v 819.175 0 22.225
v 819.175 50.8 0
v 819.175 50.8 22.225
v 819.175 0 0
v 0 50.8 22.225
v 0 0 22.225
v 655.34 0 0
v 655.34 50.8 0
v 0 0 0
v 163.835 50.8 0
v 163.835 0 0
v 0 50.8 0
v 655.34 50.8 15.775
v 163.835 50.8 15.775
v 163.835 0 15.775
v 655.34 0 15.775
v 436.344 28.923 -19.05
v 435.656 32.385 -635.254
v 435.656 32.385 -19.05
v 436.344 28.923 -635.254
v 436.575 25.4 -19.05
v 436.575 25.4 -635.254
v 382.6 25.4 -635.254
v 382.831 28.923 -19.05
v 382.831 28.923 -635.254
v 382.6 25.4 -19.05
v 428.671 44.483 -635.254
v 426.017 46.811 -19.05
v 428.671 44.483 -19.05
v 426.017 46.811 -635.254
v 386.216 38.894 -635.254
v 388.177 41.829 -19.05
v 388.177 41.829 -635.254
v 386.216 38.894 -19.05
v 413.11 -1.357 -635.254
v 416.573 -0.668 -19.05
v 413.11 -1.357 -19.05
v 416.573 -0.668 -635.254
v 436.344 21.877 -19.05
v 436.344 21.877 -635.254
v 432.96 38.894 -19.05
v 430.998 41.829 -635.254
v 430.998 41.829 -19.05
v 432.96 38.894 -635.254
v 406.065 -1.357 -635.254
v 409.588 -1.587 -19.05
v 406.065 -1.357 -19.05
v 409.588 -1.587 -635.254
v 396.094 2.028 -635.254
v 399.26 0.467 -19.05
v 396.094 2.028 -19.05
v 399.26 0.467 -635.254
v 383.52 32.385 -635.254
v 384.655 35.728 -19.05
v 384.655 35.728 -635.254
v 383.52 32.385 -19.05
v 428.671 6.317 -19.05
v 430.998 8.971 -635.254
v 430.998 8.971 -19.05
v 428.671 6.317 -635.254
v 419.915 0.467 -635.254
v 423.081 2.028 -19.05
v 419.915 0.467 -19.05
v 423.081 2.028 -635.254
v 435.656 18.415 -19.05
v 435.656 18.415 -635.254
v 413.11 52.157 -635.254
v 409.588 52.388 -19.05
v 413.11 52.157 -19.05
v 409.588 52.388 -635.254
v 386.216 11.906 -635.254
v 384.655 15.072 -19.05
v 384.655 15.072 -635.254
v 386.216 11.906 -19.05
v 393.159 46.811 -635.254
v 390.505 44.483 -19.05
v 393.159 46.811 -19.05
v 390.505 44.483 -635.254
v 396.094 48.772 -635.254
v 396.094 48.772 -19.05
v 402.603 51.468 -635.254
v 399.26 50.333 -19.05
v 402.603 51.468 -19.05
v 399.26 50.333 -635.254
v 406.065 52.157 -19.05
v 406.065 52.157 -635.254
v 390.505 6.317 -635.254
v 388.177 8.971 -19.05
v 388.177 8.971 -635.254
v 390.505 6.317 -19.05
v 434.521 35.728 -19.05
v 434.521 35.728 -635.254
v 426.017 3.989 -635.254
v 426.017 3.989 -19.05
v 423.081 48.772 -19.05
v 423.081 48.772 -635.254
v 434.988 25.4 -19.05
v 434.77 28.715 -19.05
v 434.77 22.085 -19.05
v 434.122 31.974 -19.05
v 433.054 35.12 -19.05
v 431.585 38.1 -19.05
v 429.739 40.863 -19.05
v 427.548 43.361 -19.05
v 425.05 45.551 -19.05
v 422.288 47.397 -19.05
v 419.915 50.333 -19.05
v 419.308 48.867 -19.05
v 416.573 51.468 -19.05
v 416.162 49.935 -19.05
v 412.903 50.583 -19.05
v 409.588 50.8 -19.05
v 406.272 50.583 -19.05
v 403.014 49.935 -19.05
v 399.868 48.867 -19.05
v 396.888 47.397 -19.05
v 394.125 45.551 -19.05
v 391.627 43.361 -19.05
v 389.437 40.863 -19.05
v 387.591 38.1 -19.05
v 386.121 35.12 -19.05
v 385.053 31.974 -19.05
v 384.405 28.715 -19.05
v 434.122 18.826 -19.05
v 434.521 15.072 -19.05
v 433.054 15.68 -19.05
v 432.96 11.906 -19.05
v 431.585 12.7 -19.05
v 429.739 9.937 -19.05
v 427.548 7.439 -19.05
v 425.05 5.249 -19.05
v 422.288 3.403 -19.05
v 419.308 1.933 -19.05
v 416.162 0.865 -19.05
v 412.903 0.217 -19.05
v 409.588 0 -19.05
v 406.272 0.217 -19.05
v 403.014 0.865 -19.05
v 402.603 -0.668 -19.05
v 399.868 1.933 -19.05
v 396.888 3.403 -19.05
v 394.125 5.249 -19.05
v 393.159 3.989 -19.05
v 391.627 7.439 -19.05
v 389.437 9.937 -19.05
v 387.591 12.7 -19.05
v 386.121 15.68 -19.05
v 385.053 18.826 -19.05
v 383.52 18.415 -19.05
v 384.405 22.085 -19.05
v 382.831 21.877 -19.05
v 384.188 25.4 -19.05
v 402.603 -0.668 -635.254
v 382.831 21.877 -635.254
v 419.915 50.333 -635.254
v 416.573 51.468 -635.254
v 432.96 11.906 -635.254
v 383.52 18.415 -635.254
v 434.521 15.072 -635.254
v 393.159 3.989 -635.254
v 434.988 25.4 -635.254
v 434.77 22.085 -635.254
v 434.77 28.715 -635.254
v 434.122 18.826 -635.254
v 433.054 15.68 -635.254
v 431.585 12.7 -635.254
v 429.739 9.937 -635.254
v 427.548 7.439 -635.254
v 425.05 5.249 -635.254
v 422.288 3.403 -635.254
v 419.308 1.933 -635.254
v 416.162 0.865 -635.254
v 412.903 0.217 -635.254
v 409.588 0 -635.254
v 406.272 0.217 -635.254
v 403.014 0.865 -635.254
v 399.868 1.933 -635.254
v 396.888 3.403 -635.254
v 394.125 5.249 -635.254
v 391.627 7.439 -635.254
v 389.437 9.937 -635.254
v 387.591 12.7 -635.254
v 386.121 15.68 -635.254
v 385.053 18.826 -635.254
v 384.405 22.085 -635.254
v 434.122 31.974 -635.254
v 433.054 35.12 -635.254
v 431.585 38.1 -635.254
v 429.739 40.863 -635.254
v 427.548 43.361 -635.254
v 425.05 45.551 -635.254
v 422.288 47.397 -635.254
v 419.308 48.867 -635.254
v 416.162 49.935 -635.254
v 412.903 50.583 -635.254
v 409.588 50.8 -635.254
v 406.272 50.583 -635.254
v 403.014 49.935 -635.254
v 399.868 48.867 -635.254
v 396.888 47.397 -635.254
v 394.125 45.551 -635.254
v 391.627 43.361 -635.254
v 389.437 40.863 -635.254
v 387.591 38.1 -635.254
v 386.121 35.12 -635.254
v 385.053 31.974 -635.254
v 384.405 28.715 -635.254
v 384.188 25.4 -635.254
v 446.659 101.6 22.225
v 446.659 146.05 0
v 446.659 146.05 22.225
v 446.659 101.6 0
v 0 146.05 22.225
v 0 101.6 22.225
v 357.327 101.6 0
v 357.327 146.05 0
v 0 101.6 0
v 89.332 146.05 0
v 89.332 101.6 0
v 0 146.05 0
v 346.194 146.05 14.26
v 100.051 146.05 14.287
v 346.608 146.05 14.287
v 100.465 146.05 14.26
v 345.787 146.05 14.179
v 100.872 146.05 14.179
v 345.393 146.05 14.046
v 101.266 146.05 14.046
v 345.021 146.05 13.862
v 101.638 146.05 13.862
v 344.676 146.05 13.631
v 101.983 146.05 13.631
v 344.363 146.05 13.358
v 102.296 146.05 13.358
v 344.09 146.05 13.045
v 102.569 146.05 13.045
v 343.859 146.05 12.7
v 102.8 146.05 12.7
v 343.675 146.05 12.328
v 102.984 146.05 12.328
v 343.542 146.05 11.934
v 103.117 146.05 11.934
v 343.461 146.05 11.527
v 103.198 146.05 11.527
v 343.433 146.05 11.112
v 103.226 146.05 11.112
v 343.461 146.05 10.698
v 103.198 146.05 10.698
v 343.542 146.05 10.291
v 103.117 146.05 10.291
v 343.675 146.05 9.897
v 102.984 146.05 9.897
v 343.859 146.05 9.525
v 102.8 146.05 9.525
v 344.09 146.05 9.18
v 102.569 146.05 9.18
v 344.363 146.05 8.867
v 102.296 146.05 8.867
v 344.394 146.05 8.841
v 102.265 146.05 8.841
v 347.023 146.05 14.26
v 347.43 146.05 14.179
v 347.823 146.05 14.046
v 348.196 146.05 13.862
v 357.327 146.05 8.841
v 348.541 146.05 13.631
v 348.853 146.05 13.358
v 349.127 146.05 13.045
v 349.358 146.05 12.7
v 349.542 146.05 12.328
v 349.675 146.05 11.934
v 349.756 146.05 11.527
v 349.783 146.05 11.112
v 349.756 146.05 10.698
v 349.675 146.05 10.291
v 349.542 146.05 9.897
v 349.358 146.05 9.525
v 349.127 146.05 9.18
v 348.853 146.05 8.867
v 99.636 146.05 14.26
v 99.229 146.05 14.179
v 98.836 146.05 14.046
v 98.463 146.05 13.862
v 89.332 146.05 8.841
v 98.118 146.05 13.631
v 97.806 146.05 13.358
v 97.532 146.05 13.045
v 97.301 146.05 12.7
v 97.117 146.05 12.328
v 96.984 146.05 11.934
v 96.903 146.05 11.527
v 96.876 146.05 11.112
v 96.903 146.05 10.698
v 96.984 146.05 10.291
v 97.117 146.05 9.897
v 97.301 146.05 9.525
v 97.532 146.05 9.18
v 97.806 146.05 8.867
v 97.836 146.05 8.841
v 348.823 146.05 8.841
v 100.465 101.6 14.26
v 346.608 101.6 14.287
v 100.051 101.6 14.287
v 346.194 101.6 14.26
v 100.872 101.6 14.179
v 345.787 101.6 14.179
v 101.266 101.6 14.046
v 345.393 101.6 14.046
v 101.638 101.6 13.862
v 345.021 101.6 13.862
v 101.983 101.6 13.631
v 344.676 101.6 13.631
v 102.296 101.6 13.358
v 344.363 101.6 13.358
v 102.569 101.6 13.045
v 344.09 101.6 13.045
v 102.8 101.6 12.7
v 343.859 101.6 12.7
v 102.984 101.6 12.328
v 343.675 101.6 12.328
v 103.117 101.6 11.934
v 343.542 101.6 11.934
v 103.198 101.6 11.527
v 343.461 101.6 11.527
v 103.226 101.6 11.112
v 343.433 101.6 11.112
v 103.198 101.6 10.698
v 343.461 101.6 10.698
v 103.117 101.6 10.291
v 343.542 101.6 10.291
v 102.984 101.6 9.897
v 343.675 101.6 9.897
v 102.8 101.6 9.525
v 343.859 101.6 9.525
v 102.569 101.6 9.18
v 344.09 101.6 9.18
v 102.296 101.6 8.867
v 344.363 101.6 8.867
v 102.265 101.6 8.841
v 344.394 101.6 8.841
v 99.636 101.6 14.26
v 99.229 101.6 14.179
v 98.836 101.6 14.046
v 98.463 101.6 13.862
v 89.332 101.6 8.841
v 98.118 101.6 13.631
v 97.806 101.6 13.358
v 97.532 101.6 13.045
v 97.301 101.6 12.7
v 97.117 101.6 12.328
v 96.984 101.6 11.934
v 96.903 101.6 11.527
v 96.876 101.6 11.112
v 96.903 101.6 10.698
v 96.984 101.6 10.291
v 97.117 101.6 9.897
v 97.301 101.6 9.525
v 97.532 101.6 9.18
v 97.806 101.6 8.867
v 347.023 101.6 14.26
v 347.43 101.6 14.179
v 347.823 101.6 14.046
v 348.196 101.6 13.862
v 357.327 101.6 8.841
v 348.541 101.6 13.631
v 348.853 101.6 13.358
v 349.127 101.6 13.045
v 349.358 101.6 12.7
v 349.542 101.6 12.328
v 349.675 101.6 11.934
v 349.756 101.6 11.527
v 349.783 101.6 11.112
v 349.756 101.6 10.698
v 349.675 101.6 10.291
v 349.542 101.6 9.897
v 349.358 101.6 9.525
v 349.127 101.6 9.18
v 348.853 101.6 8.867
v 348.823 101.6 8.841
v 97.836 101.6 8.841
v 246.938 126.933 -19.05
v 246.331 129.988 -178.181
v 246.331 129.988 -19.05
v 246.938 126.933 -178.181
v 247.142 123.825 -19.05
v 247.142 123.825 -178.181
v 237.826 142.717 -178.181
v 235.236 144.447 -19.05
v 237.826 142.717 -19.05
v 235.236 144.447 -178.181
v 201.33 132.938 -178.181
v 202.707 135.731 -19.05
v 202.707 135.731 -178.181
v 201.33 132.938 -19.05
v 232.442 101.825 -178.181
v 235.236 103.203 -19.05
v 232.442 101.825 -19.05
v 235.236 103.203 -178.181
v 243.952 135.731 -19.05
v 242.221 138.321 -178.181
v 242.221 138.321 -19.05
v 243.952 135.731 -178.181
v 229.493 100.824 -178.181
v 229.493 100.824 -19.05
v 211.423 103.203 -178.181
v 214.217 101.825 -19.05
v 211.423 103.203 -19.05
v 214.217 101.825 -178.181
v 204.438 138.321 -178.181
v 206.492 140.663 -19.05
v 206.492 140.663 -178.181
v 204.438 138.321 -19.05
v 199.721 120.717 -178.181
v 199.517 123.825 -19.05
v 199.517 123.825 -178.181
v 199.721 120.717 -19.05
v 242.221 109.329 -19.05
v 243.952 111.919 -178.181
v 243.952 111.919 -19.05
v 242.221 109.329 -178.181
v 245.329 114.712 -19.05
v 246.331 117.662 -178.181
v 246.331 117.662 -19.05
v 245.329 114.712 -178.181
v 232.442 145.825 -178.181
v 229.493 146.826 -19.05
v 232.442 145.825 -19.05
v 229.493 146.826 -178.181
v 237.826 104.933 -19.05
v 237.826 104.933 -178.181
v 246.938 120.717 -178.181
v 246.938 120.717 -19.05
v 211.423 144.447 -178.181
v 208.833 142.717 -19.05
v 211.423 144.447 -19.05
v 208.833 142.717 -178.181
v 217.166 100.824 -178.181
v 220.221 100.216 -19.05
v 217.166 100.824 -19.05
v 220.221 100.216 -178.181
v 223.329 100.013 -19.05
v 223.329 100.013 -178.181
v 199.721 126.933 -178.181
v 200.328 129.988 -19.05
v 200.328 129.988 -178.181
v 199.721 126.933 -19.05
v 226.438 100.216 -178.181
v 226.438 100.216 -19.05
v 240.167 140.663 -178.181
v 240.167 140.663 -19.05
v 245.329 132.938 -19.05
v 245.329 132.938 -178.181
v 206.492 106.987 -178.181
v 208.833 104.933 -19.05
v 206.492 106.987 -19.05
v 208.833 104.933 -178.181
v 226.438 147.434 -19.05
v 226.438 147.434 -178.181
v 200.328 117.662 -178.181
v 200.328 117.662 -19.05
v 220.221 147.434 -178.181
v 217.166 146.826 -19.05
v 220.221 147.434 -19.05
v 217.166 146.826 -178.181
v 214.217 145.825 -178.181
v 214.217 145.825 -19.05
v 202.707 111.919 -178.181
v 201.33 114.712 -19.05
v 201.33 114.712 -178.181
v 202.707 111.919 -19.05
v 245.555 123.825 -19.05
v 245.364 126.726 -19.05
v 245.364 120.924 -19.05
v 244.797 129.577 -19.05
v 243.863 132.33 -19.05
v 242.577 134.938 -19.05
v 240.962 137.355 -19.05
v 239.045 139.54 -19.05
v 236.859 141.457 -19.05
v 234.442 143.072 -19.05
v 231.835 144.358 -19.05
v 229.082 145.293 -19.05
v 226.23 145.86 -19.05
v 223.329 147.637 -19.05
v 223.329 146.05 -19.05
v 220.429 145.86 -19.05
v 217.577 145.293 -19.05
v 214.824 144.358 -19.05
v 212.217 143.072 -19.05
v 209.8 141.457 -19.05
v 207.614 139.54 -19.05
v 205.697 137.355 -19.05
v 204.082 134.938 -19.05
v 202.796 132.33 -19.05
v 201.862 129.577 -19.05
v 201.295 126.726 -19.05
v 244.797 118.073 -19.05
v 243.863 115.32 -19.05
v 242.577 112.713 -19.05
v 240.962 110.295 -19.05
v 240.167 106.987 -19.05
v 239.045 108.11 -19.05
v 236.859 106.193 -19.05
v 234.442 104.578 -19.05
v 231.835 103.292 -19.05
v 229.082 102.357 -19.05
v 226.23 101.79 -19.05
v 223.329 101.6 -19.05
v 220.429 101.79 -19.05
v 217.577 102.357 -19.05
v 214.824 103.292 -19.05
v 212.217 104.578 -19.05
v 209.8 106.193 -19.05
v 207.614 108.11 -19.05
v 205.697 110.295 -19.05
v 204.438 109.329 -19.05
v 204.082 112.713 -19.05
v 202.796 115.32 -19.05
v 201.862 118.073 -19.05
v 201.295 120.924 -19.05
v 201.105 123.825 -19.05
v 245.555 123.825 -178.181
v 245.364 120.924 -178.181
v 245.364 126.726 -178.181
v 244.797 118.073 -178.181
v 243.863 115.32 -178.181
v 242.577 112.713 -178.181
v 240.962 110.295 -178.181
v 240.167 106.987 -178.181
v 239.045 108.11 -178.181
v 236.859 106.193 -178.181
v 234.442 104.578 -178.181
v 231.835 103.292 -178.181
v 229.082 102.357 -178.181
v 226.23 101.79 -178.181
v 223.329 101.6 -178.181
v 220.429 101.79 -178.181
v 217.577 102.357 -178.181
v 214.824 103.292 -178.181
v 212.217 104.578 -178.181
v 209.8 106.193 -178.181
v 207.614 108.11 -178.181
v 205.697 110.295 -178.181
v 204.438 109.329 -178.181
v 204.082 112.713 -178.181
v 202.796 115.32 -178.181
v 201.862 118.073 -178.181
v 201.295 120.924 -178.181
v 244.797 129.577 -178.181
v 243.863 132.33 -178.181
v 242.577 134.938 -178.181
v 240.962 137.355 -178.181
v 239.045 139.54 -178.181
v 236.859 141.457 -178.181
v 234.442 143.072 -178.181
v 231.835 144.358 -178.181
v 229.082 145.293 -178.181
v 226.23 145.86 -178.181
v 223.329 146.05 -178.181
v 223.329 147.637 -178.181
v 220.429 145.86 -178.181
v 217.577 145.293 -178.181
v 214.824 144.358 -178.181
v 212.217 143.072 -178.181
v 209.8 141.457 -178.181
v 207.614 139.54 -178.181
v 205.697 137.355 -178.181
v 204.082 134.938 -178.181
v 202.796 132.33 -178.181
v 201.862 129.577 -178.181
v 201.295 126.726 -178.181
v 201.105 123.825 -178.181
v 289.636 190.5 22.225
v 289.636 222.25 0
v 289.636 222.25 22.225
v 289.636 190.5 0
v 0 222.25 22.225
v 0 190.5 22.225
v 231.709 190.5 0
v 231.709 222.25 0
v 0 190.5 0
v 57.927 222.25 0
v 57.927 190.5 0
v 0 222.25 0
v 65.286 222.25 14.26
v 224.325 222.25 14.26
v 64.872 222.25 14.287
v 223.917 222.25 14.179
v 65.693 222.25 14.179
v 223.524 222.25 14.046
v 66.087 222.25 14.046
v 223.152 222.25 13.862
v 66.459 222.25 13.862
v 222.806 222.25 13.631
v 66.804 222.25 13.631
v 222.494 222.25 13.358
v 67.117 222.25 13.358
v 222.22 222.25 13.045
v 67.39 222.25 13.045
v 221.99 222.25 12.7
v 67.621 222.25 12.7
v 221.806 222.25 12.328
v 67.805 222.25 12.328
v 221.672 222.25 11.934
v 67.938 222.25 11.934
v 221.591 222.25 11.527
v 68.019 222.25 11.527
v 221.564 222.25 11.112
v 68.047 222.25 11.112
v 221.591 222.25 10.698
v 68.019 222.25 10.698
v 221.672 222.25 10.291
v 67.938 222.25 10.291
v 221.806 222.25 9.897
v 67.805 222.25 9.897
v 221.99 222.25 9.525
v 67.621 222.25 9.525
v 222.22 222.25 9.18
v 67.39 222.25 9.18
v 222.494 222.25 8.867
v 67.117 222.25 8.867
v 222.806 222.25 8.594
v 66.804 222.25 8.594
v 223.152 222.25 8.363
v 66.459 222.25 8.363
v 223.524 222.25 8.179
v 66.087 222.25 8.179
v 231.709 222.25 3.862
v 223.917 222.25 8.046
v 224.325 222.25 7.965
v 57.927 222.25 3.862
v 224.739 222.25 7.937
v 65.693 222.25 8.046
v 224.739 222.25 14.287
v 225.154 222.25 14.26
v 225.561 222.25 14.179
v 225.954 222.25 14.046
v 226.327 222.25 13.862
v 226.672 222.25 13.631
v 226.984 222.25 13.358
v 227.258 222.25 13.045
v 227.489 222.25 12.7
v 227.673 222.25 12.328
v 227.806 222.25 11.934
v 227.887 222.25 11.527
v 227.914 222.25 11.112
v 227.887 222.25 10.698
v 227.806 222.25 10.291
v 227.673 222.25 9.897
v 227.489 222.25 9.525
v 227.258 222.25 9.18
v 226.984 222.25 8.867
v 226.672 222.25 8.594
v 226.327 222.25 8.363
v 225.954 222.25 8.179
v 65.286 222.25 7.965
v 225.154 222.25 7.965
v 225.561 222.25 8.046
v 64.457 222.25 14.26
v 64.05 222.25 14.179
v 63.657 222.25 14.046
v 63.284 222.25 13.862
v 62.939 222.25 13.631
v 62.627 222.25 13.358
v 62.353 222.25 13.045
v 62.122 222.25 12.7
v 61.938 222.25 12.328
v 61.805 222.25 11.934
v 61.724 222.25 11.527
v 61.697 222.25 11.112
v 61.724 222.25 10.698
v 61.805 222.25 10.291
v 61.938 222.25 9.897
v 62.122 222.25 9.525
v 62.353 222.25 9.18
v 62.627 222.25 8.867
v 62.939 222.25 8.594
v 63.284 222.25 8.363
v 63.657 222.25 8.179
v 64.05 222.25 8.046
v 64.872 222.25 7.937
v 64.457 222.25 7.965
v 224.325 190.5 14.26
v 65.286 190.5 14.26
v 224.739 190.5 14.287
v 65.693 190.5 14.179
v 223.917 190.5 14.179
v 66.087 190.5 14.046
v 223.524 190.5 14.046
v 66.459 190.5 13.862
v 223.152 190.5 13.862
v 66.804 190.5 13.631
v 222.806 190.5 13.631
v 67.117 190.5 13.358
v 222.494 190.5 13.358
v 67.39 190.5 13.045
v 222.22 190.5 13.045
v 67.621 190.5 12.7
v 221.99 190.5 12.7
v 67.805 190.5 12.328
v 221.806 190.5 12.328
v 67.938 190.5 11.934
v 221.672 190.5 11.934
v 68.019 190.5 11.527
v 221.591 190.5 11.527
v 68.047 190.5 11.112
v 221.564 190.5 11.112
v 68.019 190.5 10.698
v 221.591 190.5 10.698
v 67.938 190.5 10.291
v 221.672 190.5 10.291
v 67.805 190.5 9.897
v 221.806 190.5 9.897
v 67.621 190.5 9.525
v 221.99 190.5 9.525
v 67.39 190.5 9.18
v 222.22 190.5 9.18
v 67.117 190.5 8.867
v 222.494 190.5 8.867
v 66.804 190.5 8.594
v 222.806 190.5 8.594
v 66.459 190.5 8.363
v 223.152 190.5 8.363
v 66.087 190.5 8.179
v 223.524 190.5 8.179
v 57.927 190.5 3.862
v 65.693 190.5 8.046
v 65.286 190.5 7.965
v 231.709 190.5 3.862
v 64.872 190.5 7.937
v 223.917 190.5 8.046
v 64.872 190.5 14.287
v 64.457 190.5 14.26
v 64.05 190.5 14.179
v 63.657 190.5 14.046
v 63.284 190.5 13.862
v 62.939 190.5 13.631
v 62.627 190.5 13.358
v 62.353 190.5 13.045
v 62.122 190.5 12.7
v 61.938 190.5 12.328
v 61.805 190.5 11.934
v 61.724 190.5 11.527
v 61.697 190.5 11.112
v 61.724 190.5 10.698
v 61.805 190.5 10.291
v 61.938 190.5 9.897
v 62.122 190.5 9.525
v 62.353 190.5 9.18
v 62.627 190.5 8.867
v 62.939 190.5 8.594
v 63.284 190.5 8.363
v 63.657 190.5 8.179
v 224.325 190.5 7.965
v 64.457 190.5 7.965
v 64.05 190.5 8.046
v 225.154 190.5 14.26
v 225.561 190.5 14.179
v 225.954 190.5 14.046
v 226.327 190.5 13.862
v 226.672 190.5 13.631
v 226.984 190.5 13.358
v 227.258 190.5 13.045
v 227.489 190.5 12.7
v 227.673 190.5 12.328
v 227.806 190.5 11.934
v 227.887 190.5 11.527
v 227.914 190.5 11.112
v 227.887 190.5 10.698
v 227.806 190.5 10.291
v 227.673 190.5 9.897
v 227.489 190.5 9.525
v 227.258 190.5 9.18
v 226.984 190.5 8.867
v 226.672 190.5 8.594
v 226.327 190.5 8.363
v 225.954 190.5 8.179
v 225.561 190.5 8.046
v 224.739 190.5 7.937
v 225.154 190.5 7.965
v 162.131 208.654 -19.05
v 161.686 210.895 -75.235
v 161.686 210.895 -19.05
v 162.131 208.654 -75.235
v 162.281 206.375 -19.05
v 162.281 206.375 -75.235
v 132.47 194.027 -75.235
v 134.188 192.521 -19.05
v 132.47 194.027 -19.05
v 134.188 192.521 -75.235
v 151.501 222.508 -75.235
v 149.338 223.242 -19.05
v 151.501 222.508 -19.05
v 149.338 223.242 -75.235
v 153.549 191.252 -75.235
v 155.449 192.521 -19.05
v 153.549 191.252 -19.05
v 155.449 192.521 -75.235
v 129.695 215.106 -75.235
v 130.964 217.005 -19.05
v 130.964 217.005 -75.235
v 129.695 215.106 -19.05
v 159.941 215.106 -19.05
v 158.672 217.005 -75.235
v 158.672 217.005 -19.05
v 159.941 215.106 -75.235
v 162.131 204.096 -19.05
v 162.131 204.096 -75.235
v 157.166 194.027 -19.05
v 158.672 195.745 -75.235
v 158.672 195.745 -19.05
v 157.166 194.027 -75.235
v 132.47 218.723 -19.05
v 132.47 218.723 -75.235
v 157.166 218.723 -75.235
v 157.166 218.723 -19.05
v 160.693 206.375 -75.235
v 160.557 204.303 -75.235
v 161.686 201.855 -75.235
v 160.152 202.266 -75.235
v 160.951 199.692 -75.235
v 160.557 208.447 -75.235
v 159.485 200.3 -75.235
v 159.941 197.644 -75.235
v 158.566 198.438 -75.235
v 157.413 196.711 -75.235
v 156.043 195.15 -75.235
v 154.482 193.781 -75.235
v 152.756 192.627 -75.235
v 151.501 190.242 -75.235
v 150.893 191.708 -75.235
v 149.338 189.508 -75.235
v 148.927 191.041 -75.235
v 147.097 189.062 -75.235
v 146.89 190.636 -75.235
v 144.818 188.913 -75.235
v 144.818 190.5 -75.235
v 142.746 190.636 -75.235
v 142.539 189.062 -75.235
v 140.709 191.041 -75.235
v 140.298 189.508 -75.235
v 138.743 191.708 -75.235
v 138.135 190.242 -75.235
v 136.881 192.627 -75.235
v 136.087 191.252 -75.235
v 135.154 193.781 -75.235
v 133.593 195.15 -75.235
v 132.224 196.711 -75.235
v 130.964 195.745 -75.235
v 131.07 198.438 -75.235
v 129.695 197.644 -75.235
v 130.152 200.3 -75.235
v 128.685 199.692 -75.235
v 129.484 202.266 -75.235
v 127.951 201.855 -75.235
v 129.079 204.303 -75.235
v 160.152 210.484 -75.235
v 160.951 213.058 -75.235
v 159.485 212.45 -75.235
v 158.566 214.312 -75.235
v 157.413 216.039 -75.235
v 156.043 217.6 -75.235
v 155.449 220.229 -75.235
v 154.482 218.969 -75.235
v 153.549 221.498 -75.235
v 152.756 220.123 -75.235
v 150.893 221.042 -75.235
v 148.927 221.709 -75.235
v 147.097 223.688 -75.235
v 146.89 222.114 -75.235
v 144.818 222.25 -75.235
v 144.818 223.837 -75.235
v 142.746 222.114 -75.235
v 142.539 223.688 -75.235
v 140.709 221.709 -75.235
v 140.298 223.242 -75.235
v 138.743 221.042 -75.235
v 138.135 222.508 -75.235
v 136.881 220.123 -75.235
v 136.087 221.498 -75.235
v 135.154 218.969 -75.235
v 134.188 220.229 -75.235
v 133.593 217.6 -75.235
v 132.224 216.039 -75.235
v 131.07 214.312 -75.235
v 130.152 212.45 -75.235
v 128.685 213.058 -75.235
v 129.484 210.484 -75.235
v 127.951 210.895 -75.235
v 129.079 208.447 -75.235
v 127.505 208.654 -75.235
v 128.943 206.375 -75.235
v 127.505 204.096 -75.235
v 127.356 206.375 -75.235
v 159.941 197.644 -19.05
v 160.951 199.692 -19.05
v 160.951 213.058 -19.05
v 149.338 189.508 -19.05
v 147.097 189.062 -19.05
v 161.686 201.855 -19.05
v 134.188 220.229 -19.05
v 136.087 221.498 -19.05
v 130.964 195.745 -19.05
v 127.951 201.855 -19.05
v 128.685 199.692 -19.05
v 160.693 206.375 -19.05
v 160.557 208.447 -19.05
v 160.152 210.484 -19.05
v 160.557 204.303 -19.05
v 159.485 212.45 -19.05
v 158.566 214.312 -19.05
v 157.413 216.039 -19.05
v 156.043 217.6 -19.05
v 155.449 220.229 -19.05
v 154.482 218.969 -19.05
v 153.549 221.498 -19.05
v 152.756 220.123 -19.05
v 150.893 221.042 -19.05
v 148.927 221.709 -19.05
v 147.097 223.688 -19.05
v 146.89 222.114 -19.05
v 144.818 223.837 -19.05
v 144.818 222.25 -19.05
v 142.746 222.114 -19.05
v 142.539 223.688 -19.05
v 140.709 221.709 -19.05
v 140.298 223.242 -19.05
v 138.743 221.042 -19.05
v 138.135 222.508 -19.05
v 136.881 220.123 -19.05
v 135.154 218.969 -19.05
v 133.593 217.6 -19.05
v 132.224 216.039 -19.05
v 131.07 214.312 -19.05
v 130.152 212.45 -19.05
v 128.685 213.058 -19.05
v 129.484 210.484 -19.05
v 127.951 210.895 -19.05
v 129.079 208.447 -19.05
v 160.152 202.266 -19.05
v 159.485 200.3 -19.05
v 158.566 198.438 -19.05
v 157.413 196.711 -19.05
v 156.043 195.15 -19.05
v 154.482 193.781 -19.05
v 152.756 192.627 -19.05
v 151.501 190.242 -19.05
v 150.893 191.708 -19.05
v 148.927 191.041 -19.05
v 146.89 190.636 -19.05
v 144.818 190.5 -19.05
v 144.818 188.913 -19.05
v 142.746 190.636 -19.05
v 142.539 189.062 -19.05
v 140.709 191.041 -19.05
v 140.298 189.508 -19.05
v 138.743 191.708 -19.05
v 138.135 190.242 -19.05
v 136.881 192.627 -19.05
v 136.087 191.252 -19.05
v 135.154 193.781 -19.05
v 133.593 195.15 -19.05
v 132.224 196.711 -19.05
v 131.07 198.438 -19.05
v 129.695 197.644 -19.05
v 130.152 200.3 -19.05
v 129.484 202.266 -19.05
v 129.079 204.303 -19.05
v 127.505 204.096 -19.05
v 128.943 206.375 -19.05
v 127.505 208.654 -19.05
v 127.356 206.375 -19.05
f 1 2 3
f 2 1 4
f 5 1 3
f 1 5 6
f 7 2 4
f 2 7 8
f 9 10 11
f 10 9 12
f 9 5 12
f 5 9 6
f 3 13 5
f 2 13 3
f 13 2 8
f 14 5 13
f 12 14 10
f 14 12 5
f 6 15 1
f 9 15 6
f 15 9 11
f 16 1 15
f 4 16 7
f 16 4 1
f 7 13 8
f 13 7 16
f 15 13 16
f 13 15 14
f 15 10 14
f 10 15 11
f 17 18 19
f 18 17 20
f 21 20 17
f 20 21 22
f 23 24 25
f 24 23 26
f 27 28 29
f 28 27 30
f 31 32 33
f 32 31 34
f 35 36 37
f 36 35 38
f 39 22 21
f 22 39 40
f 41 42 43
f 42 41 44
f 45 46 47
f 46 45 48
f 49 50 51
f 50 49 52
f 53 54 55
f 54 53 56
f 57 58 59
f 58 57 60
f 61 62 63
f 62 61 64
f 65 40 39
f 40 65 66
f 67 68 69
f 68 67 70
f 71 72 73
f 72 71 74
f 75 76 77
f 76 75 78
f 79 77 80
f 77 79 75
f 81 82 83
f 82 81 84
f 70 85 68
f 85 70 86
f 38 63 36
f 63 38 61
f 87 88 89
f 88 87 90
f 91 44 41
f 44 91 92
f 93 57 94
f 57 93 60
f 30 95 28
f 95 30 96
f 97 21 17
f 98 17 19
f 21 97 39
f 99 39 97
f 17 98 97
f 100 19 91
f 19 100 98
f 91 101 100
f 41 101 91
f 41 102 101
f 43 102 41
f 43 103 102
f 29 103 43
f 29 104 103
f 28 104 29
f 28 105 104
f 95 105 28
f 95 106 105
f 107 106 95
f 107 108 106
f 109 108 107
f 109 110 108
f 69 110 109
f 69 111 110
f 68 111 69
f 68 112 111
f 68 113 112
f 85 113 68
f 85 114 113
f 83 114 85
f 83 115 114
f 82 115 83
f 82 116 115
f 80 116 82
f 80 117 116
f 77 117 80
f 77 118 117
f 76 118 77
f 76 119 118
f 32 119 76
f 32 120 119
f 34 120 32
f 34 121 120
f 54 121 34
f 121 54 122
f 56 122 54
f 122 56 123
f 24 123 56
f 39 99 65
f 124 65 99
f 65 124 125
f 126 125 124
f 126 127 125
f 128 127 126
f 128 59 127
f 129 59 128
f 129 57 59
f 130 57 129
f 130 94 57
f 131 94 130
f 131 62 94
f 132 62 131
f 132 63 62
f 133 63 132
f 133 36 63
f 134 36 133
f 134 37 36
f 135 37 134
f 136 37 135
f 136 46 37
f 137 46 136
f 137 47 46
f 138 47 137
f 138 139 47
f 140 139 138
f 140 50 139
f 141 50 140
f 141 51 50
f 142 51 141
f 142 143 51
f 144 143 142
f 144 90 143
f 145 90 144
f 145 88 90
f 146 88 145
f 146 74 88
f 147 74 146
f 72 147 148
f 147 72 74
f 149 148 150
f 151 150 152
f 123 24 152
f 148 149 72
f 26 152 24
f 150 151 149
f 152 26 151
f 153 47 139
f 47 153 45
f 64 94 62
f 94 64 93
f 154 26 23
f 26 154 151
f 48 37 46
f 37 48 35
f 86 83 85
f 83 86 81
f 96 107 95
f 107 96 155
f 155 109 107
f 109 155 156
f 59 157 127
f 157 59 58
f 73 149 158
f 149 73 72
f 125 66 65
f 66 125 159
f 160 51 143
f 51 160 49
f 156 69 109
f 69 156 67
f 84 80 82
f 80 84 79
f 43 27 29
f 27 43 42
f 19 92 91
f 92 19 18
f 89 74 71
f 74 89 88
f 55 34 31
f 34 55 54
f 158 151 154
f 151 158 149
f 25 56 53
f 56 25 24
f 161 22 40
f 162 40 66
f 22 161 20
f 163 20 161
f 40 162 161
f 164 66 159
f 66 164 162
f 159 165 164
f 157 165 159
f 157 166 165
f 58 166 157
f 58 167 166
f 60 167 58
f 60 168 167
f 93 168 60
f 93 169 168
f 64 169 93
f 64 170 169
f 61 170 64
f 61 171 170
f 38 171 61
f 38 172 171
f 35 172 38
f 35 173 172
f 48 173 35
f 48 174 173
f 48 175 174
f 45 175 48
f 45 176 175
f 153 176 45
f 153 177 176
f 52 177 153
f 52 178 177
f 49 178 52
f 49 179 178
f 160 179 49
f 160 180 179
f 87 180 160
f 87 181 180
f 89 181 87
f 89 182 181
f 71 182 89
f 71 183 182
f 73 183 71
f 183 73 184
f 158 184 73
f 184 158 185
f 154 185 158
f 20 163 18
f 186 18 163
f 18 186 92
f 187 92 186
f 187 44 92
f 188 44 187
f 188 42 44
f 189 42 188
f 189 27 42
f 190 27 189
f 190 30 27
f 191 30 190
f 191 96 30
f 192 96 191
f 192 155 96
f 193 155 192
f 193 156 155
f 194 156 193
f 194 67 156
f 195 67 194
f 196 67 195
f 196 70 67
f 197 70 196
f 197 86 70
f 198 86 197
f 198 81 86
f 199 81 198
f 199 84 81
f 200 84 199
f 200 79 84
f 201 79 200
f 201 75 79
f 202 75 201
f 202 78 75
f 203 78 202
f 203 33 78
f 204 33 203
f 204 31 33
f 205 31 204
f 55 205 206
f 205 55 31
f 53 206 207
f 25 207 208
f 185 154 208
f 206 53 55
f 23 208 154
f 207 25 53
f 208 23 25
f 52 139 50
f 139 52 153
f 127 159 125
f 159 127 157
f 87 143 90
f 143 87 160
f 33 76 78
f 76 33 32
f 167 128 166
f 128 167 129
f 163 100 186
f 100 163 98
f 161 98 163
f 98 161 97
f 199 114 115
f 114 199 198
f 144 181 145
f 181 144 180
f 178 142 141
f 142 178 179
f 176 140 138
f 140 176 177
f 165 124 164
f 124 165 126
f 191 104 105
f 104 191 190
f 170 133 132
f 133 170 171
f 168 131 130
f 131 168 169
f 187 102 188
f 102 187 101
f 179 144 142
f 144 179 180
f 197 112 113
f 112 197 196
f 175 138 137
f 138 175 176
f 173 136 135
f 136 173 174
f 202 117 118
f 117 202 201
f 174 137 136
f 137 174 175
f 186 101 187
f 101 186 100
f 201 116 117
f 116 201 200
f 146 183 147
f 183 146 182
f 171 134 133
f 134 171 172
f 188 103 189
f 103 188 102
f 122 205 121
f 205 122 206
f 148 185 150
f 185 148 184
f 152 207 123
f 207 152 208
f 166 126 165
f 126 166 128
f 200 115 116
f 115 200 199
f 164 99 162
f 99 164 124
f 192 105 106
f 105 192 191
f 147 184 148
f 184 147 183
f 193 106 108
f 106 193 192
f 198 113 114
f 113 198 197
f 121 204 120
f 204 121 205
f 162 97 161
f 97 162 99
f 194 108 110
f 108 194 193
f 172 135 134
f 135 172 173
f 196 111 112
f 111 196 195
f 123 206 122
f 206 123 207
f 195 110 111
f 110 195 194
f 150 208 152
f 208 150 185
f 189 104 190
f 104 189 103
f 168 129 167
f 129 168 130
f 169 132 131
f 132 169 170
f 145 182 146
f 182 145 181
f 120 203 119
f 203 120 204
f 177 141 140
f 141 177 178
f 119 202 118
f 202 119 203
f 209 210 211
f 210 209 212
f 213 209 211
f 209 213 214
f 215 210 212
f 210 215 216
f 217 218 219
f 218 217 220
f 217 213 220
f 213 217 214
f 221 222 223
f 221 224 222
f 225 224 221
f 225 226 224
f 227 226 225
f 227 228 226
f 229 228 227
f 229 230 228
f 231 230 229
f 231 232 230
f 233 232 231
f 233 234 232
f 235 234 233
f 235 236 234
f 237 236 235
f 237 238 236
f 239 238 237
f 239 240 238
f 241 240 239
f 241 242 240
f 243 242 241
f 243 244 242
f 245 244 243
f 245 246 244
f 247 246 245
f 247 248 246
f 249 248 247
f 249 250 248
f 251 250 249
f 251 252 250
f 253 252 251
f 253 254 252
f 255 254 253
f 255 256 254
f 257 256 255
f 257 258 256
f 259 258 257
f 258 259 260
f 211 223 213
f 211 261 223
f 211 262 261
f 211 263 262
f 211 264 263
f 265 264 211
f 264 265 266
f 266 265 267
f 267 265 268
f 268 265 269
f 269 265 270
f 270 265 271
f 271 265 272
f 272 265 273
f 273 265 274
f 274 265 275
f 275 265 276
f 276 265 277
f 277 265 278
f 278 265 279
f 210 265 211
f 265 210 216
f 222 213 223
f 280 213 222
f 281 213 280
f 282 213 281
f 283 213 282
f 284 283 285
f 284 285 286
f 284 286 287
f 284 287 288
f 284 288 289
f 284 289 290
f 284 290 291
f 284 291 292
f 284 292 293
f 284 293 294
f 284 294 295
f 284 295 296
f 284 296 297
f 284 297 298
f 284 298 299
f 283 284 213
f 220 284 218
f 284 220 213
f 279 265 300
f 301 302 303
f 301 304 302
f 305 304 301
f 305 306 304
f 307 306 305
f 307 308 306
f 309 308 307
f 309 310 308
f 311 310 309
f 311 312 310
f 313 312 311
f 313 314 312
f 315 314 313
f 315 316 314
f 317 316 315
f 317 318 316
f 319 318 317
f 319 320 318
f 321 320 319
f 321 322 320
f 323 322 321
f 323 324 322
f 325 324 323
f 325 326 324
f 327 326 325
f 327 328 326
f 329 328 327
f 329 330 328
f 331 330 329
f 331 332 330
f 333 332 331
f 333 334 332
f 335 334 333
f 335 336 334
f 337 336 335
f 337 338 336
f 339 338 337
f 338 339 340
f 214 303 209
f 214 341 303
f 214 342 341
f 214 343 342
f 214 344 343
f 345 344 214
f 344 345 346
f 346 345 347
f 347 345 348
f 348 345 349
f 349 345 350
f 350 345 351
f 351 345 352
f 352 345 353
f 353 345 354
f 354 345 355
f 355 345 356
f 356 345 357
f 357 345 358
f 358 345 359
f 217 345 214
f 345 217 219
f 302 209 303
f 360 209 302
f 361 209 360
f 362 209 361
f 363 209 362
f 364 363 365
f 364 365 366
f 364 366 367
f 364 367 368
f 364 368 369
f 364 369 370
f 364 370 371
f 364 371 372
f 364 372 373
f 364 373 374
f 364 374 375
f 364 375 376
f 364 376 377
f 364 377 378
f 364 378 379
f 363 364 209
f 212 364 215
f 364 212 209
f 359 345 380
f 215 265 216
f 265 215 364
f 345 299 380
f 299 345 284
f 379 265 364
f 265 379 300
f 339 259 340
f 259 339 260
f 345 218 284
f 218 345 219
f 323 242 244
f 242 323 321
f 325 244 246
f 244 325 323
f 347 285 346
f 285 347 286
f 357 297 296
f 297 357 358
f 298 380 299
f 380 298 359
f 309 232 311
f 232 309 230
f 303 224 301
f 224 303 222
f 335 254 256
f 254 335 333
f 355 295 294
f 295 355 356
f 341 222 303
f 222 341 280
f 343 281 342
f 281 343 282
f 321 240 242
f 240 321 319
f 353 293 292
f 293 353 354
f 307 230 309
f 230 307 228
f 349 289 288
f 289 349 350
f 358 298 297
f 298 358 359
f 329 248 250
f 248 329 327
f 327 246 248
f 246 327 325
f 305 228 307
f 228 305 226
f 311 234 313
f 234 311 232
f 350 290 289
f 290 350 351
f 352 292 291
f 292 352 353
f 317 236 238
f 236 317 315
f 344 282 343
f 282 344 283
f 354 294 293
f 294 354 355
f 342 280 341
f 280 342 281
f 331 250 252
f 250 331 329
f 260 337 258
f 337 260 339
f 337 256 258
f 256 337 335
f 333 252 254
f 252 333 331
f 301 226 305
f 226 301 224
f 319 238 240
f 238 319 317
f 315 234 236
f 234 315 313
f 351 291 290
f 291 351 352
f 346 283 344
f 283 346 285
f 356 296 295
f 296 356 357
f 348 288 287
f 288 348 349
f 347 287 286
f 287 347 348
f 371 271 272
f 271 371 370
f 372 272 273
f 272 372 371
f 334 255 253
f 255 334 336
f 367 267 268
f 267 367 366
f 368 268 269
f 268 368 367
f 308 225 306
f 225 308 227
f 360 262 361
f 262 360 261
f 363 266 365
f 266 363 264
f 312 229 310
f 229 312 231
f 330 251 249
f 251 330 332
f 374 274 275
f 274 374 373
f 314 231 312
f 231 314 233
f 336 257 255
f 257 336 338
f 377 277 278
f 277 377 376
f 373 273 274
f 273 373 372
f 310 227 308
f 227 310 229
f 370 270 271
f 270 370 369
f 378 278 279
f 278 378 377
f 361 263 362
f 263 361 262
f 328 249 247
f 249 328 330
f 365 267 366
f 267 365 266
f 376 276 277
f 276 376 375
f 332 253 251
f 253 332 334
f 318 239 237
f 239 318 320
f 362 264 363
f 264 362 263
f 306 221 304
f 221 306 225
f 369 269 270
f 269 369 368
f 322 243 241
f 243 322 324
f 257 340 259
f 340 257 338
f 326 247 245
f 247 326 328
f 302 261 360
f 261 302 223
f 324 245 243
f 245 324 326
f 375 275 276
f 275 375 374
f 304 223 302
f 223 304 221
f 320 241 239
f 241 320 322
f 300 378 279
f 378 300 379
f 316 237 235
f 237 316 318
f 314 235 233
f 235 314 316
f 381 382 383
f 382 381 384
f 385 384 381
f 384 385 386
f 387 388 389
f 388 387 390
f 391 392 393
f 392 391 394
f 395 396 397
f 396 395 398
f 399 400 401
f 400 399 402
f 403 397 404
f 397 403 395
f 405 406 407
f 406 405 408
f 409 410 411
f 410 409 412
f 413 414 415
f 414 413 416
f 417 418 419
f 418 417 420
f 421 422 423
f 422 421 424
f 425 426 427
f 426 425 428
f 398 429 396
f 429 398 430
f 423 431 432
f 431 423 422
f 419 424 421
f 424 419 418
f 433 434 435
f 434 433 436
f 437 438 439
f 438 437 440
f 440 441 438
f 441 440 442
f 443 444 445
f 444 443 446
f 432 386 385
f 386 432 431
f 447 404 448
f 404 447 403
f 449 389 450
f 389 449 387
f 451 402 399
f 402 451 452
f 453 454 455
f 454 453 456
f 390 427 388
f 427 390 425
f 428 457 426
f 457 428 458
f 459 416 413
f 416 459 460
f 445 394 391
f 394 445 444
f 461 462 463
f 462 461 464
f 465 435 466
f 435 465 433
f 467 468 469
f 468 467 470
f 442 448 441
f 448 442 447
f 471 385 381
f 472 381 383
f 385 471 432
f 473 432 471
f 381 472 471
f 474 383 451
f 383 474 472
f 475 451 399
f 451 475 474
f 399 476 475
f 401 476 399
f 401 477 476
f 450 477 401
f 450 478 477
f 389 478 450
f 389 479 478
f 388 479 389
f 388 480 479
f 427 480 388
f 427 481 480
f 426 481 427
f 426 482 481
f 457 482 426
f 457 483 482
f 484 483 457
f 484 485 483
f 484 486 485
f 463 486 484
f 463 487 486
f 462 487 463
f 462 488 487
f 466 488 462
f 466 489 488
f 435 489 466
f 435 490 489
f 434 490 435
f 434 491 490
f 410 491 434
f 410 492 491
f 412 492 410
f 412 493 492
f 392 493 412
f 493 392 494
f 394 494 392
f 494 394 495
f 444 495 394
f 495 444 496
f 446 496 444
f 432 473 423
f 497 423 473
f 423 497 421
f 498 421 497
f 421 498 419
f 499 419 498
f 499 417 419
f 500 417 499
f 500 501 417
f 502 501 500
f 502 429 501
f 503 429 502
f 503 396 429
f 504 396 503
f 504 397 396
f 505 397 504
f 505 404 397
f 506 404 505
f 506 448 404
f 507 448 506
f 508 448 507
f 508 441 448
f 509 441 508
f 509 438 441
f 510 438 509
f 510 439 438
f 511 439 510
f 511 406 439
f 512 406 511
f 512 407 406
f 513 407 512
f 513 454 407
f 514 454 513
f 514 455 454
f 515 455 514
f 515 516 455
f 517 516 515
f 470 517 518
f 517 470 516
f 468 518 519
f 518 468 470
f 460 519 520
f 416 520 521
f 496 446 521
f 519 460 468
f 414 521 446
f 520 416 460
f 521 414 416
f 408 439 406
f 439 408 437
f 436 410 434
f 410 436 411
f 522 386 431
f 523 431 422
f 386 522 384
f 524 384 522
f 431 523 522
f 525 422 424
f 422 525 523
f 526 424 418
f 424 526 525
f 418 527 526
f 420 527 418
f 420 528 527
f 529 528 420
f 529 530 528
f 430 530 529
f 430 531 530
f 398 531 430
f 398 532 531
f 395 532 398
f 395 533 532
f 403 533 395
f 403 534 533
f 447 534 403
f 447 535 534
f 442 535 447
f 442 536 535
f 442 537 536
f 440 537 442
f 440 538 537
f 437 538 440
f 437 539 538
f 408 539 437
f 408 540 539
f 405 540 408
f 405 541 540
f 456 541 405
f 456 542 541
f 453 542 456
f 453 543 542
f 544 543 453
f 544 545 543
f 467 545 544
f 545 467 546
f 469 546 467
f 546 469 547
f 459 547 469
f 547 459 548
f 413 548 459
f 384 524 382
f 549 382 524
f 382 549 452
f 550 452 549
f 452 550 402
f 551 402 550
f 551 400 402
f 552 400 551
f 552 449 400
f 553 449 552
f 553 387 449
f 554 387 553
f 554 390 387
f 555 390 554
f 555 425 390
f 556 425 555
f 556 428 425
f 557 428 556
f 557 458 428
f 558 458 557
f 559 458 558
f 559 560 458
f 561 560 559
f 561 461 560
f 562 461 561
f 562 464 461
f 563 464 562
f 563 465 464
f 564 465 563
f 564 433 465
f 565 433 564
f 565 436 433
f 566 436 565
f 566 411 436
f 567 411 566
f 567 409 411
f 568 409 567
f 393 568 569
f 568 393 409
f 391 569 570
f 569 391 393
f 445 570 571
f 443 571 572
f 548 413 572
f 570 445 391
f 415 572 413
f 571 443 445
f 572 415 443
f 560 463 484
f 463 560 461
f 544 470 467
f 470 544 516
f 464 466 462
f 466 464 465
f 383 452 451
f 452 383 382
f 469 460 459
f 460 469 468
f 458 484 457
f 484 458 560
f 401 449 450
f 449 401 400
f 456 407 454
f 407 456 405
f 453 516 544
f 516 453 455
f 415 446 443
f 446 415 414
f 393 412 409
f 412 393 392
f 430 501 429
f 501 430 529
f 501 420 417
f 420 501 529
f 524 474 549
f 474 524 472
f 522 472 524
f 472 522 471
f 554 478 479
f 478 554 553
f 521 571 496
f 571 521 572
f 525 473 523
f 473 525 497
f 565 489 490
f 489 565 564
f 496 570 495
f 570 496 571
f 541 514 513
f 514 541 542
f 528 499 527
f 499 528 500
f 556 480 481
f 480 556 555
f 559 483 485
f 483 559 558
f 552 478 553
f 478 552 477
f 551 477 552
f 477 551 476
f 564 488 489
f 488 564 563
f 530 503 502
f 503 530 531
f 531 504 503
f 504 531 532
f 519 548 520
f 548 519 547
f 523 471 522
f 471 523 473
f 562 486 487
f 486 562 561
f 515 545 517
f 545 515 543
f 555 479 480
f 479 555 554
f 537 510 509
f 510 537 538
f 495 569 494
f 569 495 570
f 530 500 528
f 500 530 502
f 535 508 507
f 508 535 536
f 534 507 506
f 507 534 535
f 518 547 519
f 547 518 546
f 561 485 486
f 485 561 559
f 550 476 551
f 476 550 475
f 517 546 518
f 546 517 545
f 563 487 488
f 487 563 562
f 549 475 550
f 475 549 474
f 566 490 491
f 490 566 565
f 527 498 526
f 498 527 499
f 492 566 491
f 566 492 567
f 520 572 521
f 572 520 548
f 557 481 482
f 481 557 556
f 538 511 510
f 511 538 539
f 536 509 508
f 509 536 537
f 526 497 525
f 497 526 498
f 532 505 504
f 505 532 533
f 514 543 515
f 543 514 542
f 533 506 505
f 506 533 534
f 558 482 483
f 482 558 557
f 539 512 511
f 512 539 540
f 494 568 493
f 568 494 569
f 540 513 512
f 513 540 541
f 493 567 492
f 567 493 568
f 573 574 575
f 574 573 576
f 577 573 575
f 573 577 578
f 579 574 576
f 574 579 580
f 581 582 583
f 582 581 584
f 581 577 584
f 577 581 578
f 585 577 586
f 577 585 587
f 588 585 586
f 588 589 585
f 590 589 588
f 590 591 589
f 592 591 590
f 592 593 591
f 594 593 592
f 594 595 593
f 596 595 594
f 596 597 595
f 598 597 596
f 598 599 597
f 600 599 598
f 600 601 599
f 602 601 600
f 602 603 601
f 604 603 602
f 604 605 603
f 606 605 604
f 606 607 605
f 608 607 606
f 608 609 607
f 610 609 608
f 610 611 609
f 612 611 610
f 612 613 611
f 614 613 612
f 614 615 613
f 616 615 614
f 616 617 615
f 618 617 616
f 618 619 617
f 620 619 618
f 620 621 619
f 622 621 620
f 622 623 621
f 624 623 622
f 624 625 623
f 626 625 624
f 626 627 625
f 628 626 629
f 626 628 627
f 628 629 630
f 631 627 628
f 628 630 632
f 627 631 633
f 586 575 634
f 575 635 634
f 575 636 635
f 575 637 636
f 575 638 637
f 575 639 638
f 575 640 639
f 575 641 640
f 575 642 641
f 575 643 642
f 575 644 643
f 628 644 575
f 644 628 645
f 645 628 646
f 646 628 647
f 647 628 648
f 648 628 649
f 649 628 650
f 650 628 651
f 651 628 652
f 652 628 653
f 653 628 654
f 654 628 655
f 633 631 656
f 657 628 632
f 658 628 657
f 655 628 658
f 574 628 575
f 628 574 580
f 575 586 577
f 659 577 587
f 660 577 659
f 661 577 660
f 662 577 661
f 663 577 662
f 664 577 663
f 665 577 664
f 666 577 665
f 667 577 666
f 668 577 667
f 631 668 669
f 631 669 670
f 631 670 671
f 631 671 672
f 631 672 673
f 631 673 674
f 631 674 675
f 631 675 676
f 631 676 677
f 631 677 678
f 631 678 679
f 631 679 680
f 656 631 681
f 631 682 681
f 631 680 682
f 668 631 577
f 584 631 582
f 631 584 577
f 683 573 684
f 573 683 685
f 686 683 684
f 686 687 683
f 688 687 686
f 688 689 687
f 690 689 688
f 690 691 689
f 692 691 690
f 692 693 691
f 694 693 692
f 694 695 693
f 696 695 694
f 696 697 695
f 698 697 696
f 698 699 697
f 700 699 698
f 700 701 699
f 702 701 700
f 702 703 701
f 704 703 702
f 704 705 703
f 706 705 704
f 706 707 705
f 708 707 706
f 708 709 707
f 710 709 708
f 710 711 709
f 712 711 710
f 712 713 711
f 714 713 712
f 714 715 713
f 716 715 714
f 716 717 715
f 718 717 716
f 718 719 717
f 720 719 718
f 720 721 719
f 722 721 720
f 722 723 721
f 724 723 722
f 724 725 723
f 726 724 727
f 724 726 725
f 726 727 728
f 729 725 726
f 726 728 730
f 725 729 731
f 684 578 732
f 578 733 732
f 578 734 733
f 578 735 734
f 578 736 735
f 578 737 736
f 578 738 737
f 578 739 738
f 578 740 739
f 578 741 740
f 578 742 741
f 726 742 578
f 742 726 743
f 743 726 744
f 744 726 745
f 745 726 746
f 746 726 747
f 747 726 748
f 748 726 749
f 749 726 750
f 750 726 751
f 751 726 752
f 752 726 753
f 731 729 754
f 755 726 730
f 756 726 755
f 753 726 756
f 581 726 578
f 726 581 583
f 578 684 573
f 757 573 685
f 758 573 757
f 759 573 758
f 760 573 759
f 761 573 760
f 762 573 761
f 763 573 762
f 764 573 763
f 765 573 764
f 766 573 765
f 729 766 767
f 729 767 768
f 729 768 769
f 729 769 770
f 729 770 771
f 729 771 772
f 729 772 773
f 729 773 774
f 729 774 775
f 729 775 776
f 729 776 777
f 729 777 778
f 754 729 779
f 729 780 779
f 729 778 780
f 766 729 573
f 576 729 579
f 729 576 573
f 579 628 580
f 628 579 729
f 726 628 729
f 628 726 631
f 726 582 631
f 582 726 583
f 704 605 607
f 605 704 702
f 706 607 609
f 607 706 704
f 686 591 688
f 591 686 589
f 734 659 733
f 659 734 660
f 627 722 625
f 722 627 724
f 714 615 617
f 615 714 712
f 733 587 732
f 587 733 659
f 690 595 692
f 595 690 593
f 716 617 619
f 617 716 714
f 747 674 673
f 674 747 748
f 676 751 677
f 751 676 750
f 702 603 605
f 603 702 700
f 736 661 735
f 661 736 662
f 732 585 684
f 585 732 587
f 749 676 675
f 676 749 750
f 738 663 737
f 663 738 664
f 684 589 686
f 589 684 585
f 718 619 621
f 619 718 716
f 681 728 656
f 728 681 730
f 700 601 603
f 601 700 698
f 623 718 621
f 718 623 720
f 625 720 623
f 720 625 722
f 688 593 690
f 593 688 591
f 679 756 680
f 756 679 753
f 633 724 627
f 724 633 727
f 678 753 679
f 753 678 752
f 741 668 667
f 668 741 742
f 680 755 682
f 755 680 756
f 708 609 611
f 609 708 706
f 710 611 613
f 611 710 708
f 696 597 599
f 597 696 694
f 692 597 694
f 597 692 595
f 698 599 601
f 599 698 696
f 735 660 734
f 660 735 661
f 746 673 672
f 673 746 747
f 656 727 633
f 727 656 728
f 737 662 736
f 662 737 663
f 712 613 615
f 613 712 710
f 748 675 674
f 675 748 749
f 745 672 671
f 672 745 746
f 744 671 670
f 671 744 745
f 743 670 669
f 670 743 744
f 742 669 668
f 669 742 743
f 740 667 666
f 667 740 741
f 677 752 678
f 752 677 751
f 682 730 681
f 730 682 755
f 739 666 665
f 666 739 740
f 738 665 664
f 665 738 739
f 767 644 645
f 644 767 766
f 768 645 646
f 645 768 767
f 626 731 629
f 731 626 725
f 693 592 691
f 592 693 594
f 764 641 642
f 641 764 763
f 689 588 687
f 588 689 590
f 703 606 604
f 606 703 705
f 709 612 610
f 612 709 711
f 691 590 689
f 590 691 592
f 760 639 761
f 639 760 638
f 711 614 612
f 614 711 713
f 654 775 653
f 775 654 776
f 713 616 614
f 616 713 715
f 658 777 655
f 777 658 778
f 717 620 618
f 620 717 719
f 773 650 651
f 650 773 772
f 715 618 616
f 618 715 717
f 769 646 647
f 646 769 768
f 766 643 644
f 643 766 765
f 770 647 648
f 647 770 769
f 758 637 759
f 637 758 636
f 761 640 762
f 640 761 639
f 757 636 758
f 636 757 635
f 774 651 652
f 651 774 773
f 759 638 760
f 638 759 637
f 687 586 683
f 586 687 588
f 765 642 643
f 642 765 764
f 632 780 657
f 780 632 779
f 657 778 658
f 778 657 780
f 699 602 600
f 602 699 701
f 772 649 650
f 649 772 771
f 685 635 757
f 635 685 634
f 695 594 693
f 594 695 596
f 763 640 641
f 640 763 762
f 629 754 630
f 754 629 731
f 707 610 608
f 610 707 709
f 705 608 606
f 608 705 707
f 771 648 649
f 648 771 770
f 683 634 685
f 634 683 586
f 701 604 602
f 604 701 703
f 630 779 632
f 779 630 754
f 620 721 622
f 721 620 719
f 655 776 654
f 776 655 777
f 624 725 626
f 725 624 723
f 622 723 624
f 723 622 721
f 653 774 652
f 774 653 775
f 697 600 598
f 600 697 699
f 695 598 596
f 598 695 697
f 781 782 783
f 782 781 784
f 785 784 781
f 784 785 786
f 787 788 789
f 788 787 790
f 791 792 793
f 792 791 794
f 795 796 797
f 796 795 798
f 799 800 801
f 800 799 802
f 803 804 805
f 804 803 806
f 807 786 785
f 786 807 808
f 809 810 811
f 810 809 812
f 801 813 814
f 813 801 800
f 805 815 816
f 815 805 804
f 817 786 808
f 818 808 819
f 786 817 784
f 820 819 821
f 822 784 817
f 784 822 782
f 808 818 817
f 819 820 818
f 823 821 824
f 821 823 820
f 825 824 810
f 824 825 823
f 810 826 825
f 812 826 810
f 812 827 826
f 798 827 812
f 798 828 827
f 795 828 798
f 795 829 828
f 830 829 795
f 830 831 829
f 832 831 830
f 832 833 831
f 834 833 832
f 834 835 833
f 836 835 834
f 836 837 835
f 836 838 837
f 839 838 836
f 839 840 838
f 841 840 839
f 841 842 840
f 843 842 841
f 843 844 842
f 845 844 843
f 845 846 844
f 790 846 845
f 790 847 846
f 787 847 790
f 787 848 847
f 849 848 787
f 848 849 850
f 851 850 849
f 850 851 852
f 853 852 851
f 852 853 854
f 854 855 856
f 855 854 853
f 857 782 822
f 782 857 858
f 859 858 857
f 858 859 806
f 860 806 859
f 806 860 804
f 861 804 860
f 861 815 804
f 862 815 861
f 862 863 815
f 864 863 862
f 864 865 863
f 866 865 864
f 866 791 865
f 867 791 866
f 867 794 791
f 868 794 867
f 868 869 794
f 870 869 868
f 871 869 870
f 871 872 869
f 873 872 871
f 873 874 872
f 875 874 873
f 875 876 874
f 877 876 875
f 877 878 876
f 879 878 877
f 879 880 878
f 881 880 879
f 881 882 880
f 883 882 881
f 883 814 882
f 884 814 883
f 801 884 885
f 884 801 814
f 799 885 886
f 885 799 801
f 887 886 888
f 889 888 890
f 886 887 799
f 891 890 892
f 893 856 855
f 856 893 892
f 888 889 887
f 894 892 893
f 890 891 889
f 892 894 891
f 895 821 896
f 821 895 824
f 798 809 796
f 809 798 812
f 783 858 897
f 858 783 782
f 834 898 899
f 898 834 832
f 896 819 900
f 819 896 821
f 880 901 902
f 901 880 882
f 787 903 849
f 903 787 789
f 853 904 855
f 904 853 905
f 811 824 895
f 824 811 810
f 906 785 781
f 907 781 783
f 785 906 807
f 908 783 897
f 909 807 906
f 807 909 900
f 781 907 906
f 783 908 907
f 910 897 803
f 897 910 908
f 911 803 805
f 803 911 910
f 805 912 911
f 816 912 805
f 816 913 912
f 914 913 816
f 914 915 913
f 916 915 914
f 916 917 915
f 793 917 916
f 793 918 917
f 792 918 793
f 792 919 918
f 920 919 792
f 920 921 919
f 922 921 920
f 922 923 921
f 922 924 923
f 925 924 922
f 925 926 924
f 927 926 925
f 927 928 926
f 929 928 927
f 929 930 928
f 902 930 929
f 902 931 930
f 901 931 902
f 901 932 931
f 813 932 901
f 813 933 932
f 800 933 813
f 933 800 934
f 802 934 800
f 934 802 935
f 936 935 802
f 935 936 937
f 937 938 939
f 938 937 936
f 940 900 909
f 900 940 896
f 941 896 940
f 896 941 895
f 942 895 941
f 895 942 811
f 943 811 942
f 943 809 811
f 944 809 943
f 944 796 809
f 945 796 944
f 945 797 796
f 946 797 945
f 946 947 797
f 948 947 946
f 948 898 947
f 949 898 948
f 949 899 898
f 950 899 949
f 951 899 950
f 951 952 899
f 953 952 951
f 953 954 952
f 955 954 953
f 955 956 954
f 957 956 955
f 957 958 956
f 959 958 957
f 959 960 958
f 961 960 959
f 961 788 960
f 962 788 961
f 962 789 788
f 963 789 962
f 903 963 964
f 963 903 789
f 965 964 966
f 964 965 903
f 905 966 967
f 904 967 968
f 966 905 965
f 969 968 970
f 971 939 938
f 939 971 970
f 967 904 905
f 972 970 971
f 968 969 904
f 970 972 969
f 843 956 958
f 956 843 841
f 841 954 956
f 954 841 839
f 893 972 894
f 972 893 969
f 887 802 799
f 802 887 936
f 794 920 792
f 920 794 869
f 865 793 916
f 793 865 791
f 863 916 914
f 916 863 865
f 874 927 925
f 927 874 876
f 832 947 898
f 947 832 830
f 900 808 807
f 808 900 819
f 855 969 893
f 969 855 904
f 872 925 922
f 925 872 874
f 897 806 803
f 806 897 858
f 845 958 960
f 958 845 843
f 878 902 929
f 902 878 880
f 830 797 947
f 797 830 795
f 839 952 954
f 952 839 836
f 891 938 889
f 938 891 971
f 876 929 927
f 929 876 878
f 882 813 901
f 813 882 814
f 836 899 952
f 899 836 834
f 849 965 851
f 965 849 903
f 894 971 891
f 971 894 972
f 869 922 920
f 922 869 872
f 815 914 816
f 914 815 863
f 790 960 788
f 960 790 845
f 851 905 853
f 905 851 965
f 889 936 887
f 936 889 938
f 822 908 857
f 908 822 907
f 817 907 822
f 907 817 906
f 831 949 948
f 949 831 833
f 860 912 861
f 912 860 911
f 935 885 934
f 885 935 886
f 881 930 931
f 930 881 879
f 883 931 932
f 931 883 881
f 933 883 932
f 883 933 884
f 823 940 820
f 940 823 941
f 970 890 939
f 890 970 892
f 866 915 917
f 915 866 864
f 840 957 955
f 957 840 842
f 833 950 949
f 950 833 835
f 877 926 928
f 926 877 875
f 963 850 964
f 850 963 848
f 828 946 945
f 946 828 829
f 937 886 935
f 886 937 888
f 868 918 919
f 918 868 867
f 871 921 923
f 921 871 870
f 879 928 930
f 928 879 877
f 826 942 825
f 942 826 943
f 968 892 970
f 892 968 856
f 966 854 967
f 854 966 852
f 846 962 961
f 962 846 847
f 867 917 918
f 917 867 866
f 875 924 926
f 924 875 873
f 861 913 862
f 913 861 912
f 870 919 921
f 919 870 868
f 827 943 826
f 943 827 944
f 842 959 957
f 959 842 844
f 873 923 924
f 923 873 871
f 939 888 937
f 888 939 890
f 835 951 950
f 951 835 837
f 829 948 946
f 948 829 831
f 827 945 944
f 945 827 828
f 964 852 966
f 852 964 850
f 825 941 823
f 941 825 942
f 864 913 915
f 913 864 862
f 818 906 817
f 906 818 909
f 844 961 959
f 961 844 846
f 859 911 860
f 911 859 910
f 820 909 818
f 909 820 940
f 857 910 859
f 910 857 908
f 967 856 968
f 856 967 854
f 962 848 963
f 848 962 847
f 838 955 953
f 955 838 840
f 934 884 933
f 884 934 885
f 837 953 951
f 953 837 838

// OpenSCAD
// Marimba OpenSCAD starter.
// Build-critical dimensions live in family-spec.csv and CAD CSV files.
// This starter is for visual/spacing review, not final CAM.

$fn = 48;

function inch(x) = x * 25.4;

module bar(length_in, width_in, edge_thickness_in, center_thickness_in, arch_depth_in, node_1_in, node_2_in) {
    length = inch(length_in);
    width = inch(width_in);
    edge = inch(edge_thickness_in);
    center = inch(center_thickness_in);
    node1 = inch(node_1_in);
    node2 = inch(node_2_in);

    difference() {
        cube([length, width, edge], center=false);

        // Simplified centered underside relief. The real CAM path should use a
        // parabolic surface over about 60 percent of the bar length.
        translate([length * 0.20, -1, -0.1])
            cube([length * 0.60, width + 2, edge - center], center=false);

        translate([node1, width / 2, edge / 2])
            rotate([90, 0, 0])
                cylinder(h=width + 2, d=inch(0.25), center=true);

        translate([node2, width / 2, edge / 2])
            rotate([90, 0, 0])
                cylinder(h=width + 2, d=inch(0.25), center=true);
    }
}

module resonator(length_in, bore_in) {
    length = inch(length_in);
    bore = inch(bore_in);
    difference() {
        cylinder(h=length, d=bore + inch(0.125), center=false);
        translate([0, 0, -1])
            cylinder(h=length + 2, d=bore, center=false);
    }
}

module note_assembly(length_in, width_in, edge_thickness_in, center_thickness_in, arch_depth_in, node_1_in, node_2_in, resonator_length_in, resonator_bore_in) {
    bar(length_in, width_in, edge_thickness_in, center_thickness_in, arch_depth_in, node_1_in, node_2_in);
    translate([inch(length_in) / 2, inch(width_in) / 2, -inch(resonator_length_in) - inch(0.75)])
        resonator(resonator_length_in, resonator_bore_in);
}

// Representative configurations. Use cad/design-table-inputs.csv for the full
// SolidWorks configuration set.
translate([0, 0, 0])
    note_assembly(32.251, 2.000, 0.875, 0.250, 0.625, 7.224, 25.027, 24.260, 2.000);

translate([0, inch(4.0), 0])
    note_assembly(17.585, 1.750, 0.875, 0.523, 0.352, 3.939, 13.646, 6.265, 1.750);

translate([0, inch(7.5), 0])
    note_assembly(11.403, 1.250, 0.875, 0.719, 0.156, 2.554, 8.848, 2.212, 1.250);
